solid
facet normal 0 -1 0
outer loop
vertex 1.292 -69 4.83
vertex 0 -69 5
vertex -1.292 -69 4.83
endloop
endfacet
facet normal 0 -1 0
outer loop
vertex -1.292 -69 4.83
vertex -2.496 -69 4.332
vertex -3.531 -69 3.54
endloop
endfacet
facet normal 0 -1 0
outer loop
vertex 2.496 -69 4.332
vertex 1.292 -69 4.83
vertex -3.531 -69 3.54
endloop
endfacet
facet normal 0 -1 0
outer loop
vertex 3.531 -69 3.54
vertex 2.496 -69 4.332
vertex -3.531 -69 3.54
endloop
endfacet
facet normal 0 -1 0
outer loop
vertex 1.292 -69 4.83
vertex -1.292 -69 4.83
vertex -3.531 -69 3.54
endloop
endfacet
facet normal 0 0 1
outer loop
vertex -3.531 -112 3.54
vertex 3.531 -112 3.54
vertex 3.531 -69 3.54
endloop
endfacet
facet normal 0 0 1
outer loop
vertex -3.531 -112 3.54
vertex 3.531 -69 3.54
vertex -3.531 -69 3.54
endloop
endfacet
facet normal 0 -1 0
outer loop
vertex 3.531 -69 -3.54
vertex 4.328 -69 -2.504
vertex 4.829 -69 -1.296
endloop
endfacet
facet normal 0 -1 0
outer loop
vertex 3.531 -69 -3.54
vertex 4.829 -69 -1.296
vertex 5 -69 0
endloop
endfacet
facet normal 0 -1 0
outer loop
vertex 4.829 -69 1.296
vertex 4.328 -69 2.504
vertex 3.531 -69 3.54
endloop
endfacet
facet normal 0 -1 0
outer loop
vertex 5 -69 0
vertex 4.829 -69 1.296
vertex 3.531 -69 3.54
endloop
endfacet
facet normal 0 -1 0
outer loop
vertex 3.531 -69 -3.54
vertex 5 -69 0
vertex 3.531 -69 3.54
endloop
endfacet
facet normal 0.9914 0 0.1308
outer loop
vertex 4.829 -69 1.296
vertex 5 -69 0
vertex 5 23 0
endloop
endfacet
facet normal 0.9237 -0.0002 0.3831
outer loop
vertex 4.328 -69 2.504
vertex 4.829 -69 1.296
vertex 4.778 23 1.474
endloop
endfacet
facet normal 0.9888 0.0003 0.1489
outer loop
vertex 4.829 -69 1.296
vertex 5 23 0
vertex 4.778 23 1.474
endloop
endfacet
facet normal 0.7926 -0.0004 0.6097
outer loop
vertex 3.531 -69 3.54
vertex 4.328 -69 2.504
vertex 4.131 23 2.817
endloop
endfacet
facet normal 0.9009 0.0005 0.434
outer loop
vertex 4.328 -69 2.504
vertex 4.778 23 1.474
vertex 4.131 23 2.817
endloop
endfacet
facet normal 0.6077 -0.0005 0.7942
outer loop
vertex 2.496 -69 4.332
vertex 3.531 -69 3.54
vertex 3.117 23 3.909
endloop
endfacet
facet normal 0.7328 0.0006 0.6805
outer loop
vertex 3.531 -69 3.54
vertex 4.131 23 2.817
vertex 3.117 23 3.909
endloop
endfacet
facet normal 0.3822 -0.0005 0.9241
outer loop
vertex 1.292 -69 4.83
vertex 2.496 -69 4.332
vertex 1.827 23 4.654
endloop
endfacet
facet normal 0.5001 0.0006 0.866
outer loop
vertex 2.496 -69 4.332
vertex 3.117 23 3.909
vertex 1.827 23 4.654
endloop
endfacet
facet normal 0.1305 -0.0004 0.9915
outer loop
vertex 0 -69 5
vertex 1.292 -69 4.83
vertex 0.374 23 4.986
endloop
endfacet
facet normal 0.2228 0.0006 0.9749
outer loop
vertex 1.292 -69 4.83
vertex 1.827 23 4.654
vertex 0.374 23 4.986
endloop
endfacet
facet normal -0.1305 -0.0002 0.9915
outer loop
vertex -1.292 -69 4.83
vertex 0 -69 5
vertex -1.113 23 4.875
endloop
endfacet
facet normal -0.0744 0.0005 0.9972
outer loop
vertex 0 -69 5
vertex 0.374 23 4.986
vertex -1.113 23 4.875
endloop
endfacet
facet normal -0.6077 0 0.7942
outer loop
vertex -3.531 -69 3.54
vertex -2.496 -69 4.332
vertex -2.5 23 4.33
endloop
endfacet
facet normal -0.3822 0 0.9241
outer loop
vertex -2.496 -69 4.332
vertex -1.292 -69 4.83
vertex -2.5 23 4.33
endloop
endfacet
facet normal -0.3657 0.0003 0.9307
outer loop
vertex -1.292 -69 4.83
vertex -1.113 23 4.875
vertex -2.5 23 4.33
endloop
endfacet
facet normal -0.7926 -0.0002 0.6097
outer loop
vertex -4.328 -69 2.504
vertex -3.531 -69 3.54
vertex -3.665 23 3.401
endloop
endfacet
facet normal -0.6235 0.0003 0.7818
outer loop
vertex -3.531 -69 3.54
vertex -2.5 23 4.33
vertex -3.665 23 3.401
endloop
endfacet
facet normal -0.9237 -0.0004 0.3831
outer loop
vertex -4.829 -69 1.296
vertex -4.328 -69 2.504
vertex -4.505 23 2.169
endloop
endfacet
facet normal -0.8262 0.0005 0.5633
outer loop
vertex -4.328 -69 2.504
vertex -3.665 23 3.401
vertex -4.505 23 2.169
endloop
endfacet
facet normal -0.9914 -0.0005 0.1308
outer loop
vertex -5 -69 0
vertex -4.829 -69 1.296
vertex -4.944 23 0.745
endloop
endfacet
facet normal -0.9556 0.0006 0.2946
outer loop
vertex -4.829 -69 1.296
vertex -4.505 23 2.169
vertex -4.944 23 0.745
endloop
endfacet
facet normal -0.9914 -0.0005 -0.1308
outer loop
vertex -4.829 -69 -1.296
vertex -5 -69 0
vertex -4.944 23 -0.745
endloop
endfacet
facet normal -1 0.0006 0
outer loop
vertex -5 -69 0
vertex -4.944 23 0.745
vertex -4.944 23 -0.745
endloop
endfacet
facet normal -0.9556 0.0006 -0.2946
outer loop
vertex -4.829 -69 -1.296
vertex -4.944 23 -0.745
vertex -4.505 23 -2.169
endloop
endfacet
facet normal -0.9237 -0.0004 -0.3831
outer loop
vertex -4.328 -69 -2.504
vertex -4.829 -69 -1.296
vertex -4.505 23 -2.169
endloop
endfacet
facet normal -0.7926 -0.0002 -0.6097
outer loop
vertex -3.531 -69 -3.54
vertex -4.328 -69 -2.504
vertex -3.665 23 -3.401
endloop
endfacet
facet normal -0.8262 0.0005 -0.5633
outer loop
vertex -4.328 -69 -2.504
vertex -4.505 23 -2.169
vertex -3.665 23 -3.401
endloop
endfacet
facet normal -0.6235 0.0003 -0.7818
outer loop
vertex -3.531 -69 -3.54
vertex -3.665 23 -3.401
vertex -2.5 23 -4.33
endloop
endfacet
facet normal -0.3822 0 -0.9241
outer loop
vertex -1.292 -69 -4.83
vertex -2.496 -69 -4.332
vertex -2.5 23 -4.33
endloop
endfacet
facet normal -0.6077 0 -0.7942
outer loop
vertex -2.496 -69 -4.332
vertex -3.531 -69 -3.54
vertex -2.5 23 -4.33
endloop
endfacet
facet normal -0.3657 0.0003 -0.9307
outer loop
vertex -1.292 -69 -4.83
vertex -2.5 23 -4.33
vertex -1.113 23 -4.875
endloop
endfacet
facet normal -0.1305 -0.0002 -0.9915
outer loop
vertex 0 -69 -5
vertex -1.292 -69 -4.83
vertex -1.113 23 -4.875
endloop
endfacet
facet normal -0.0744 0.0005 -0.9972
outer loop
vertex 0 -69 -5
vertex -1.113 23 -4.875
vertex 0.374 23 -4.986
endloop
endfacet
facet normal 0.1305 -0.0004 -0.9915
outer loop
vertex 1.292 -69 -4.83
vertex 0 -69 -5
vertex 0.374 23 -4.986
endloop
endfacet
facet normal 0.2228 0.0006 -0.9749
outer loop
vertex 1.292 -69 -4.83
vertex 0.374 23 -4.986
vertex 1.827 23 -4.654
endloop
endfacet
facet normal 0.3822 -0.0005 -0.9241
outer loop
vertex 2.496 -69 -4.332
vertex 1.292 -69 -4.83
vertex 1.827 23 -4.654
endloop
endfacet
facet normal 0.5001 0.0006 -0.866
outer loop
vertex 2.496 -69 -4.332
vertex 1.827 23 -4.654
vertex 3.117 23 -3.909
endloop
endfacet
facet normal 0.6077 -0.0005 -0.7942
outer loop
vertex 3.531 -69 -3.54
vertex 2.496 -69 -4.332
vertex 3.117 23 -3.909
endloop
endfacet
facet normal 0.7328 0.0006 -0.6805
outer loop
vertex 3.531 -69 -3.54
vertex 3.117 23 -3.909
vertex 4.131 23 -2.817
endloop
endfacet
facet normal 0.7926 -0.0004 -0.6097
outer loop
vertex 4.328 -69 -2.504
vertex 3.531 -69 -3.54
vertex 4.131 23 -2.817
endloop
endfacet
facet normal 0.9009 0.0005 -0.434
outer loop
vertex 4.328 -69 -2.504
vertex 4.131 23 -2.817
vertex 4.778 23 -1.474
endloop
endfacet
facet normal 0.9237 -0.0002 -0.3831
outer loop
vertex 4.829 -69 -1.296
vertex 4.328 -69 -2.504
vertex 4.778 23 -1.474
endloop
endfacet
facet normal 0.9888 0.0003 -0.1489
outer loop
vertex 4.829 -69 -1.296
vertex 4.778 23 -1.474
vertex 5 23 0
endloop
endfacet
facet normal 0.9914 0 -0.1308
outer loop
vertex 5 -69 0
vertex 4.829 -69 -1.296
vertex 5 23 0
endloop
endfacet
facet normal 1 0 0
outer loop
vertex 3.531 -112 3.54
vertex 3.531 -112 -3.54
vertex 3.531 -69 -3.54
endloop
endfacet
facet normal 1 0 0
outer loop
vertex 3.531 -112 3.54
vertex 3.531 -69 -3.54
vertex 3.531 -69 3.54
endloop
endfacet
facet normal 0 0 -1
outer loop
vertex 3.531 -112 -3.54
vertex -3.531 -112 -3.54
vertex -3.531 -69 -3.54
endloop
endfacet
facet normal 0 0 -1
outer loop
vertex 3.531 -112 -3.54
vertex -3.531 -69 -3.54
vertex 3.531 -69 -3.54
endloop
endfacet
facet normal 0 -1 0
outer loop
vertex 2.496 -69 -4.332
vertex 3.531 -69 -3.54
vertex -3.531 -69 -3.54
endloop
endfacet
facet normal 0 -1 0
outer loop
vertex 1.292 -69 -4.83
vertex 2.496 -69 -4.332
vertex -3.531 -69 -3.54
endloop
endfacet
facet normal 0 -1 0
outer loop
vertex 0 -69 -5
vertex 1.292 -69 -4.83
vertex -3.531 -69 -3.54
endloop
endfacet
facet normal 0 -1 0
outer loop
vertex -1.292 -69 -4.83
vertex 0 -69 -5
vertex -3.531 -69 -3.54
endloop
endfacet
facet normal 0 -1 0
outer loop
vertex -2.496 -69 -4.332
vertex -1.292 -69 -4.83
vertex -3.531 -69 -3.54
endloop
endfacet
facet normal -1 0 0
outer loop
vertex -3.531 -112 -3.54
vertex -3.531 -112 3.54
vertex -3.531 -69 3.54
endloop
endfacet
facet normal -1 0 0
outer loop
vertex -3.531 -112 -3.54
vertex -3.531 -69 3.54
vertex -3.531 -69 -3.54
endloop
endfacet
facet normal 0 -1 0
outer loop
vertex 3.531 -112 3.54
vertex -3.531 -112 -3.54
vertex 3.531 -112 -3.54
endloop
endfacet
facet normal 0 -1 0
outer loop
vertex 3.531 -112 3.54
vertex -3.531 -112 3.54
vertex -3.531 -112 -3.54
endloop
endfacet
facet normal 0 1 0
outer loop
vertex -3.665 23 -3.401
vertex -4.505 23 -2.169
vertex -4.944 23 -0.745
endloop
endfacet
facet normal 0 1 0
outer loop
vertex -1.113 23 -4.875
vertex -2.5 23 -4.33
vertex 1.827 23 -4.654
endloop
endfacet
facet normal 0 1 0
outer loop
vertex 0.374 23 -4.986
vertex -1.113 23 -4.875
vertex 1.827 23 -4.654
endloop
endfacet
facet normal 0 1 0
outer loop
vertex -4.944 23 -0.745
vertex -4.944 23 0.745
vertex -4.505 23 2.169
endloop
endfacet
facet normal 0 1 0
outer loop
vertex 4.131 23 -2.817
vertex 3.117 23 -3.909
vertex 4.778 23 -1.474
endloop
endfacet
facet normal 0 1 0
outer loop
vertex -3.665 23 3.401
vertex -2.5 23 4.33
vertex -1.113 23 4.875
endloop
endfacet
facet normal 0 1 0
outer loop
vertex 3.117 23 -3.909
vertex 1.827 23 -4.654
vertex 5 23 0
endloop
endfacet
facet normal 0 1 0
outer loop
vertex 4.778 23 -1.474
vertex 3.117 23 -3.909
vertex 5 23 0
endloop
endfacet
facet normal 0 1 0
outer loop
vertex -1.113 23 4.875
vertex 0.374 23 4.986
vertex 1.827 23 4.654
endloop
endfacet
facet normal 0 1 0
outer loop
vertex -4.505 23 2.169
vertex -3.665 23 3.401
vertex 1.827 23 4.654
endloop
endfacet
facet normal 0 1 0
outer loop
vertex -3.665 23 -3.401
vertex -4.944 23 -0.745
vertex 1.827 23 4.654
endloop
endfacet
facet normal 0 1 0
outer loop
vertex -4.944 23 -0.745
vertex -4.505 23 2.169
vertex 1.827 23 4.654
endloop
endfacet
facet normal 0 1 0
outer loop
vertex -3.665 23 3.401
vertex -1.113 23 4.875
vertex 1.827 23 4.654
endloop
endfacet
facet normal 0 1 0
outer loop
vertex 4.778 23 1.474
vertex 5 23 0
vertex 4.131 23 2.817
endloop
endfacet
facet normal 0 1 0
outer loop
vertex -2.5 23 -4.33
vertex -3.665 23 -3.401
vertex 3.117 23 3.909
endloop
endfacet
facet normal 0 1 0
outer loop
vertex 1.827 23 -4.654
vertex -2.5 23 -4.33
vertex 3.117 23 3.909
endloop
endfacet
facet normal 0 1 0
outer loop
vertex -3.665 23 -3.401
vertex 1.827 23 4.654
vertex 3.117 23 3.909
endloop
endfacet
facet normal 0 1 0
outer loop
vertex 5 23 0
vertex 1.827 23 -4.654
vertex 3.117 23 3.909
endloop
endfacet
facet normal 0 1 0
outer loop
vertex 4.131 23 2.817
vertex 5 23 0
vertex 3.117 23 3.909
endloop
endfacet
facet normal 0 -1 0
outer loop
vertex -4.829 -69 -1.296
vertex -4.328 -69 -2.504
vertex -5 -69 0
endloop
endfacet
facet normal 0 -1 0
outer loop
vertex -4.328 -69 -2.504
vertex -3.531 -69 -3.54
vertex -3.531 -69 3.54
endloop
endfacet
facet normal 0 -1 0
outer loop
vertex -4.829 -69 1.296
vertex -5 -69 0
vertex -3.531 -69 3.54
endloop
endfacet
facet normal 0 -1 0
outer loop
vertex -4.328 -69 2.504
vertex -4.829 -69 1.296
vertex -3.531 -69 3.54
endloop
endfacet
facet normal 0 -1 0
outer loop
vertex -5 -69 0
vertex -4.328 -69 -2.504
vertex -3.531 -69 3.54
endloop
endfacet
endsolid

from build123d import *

# Parameters (mm, degrees)
SKETCH015_R     = 5
PAD004_DEPTH    = 135
POCKET012_DEPTH = 43
POCKET013_DEPTH = 43


with BuildPart() as part:
    # Sketch015 → Pad004 (new body)
    with BuildSketch(Plane.XZ):
        Circle(SKETCH015_R)
    extrude(amount=PAD004_DEPTH)

    # Sketch026 (on Face3 of Pad004) → Pocket012 (cut)
    with BuildSketch(Plane.XZ.offset(135)):
        Polygon((3.531062, -3.54), (3.531062, 3.54), (-3.531062, 3.54), (-3.87, 6.02), (6.78, 6.02), (6.88, -3.72), align=None)
    extrude(amount=-POCKET012_DEPTH, mode=Mode.SUBTRACT)

    # Sketch027 (on Face5 of Pocket012) → Pocket013 (cut)
    with BuildSketch(Plane.XZ.offset(135)):
        Polygon((-3.531062, 3.54), (-3.531062, -3.54), (3.531062, -3.54), (3.531062, -6.25), (-6.79, -6.25), (-6.79, 3.54), align=None)
    extrude(amount=-POCKET013_DEPTH, mode=Mode.SUBTRACT)


with BuildPart() as part_1:
    # Body005 placement: moved
    add(part.part.moved(Location((0, 23, 0))))


solid = part_1.part
